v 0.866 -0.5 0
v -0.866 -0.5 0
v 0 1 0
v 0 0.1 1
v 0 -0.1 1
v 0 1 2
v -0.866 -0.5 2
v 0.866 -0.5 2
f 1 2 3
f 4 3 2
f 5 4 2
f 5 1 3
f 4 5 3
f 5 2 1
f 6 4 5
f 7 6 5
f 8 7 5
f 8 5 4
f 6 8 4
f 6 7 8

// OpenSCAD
h = 1;

polyhedron(
  points=[
    [0,1,0],
    [cos(210), sin(210),0],
    [cos(330), sin(330),0],

    [0,0.1,h],
    [0.1*cos(270), 0.1*sin(270),h],
    [0.1*cos(270), 0.1*sin(270),h],

    [0,1,2*h],
    [cos(210), sin(210),2*h],
    [cos(330), sin(330),2*h],
  ],
  faces=[
    [0,1,2],
    [1,0,3],[1,3,4],
    [0,2,5],[0,5,3],
    [2,1,4],[2,4,5],

    [4,3,6],[4,6,7],
    [5,4,7],[5,7,8],
    [3,5,8],[3,8,6],
    [8,7,6],
  ]);
